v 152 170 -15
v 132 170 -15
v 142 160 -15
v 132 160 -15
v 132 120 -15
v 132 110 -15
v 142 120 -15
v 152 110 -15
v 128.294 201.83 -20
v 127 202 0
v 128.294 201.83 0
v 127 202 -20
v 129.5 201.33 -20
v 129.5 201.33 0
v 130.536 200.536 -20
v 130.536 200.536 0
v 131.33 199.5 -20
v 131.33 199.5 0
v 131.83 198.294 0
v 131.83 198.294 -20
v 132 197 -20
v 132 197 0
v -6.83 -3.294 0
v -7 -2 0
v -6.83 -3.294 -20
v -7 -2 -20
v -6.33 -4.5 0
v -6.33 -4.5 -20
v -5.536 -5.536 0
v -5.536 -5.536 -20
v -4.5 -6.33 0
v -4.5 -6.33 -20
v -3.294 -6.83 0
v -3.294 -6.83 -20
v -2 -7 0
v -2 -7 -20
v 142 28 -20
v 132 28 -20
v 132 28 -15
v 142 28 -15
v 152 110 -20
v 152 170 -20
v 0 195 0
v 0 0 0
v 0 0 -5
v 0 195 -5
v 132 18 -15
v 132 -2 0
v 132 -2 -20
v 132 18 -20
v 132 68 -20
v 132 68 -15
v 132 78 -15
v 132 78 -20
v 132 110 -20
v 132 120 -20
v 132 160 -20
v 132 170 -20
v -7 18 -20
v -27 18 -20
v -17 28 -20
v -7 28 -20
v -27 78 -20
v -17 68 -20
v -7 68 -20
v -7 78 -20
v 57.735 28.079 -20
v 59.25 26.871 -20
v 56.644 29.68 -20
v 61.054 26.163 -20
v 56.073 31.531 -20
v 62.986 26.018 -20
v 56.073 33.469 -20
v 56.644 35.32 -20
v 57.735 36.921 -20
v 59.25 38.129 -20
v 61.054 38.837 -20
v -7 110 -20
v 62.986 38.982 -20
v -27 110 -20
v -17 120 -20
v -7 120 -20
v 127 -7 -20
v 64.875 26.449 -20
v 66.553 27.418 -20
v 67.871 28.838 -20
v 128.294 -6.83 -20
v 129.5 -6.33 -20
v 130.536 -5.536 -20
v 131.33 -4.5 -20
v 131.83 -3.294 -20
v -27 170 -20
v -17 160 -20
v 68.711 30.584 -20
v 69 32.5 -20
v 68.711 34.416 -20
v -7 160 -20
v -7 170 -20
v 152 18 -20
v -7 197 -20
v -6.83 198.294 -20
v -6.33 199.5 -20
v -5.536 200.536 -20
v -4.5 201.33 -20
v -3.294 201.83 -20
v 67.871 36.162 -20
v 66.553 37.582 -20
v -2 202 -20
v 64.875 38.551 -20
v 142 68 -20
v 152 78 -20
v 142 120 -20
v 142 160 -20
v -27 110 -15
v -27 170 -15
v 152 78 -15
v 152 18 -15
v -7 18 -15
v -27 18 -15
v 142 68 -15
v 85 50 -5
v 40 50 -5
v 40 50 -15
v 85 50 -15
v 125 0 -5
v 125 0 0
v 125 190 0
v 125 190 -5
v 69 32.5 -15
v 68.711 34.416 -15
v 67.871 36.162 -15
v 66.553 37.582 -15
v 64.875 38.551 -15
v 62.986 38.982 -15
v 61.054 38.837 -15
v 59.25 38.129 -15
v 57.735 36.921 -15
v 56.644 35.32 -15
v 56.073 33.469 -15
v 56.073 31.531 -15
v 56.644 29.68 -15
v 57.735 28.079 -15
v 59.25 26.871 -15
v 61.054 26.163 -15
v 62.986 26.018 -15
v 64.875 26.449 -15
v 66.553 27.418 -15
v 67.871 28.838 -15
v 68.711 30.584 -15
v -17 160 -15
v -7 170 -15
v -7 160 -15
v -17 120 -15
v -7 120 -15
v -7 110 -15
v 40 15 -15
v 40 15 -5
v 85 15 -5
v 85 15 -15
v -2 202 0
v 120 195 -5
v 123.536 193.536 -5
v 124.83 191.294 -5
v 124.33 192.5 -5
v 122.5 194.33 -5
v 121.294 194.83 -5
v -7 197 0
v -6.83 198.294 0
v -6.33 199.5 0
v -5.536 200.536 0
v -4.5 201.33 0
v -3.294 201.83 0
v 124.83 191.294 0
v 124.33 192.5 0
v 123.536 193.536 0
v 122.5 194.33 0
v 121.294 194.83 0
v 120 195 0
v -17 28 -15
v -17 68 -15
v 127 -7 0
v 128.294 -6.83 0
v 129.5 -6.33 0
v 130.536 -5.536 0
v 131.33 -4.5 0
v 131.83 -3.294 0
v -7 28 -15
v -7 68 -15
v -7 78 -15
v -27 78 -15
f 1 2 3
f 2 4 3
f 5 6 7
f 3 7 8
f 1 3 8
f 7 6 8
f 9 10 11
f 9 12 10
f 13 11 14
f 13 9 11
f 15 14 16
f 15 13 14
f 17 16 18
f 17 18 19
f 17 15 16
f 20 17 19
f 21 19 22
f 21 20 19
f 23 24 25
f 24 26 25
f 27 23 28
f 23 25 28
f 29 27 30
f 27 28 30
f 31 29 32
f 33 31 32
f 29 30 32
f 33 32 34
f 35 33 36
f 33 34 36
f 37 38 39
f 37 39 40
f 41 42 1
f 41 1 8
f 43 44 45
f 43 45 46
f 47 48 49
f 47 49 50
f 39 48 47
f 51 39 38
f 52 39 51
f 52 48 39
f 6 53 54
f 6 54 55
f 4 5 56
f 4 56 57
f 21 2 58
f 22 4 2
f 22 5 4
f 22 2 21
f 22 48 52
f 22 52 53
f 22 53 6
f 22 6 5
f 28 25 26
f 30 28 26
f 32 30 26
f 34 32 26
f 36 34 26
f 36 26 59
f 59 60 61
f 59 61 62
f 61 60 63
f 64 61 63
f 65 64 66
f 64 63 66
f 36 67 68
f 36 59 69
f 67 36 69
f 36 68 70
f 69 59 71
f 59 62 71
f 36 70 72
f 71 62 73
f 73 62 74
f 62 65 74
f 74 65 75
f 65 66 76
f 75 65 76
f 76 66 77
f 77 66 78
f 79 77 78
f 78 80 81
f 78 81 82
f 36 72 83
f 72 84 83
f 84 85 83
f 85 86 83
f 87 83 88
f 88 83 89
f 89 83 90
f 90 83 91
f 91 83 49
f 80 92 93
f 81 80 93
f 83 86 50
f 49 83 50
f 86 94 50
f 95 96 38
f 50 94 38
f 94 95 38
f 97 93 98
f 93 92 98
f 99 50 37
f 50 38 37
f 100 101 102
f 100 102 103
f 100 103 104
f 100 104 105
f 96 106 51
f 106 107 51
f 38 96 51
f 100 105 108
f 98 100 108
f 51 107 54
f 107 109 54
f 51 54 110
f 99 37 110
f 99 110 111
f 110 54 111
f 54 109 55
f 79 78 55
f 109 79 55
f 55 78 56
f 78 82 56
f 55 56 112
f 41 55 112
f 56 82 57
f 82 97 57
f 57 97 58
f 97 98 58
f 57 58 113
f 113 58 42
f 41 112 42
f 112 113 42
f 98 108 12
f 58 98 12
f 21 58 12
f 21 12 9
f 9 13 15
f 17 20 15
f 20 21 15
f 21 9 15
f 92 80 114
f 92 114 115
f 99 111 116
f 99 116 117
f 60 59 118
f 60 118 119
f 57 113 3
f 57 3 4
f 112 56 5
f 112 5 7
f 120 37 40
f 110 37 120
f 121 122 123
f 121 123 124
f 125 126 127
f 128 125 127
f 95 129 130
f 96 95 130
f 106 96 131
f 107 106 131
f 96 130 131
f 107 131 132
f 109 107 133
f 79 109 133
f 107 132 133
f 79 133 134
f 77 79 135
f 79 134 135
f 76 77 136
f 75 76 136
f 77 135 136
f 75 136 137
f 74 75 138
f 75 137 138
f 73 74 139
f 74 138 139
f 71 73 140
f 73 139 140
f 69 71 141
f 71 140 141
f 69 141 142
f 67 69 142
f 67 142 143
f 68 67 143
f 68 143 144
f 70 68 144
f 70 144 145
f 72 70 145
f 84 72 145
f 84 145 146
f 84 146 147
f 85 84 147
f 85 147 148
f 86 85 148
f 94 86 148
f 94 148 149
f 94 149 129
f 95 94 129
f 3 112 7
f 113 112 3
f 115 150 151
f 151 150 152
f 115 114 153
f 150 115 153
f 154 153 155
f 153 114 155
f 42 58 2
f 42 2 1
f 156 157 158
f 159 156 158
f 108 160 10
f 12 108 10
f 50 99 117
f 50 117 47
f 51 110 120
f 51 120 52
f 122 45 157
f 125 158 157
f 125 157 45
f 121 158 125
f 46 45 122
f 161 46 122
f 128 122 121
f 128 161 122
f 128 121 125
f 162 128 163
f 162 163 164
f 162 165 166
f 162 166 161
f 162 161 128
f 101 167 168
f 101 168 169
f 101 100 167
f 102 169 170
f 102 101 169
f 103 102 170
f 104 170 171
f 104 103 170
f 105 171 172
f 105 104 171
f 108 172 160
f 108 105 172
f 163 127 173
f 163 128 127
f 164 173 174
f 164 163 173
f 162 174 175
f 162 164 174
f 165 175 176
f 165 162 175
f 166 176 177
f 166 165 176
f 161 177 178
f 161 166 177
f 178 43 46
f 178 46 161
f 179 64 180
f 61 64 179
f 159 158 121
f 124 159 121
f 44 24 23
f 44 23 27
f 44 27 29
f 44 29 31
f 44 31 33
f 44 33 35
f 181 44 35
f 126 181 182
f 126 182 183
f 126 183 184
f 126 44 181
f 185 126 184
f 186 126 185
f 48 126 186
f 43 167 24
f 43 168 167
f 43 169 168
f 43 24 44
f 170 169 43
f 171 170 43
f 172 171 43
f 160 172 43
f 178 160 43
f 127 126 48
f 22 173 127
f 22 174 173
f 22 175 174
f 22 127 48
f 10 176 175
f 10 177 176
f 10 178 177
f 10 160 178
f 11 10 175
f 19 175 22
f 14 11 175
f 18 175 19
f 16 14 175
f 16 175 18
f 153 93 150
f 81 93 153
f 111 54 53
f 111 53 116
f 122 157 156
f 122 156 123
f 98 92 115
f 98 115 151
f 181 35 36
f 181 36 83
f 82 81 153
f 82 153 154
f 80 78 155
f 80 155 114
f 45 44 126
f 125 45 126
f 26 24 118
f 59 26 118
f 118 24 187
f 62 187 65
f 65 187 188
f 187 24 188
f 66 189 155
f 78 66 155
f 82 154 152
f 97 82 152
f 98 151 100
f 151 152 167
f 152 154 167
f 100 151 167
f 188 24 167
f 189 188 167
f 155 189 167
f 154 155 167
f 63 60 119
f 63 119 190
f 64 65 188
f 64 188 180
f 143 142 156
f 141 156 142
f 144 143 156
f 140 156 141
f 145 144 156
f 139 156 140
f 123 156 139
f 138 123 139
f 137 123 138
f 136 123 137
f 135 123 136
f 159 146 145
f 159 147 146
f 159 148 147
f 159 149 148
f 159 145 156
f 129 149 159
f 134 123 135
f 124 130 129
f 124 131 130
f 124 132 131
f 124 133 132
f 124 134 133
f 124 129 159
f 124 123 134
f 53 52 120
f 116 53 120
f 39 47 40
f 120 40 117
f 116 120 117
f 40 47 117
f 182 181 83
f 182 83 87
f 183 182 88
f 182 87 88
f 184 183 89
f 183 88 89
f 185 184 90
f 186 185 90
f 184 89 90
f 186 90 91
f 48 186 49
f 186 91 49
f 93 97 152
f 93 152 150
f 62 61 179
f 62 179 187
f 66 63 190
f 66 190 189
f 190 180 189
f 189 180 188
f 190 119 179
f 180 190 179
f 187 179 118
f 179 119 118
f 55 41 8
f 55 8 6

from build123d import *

# Parameters (mm, degrees)
F0_W     = 139
F0_H     = 209
F0_W_2   = 125
F0_H_2   = 195
F1_DEPTH = 20
F2_DEPTH = 5
F3_W     = 45
F3_H     = 35
F4_DEPTH = 15
F5_R     = 6.5
F6_DEPTH = 25
F7_R     = 5
F9_DEPTH = 5


with BuildPart() as f1:
    # F0 (on Top) → F1 (new body)
    with BuildSketch(Plane.XY):
        with Locations((62.5, 97.5)):
            Rectangle(F0_W, F0_H)
        with Locations((62.5, 97.5)):
            Rectangle(F0_W_2, F0_H_2, mode=Mode.SUBTRACT)
        with Locations((62.5, 97.5)):
            Rectangle(F0_W_2, F0_H_2)
    extrude(amount=-F1_DEPTH)

    # F0 (on Top) → F2 (cut)
    with BuildSketch(Plane.XY):
        with Locations((62.5, 97.5)):
            Rectangle(F0_W_2, F0_H_2)
    extrude(amount=-F2_DEPTH, mode=Mode.SUBTRACT)

    # F3 (on face) → F4 (cut)
    with BuildSketch(Plane.XY):
        with Locations((62.5, 32.5)):
            Rectangle(F3_W, F3_H)
    extrude(amount=-F4_DEPTH, mode=Mode.SUBTRACT)

    # F5 (on face) → F6 (cut)
    with BuildSketch(Plane.XY):
        with Locations((62.5, 32.5)):
            Circle(F5_R)
    extrude(amount=-F6_DEPTH, mode=Mode.SUBTRACT)

    # F7
    f7_edges = [f1.edges().sort_by_distance(p)[0] for p in [
        (-7, -7, -10),
        (125, 195, -2.5),
        (-7, 202, -10),
        (132, -7, -10),
        (132, 202, -10),
    ]]
    fillet(f7_edges, radius=F7_R)

    # F8 (on face) → F9 (join)
    with BuildSketch(Plane(origin=(0, 0, -20), x_dir=(1, 0, 0), z_dir=(0, 0, -1))):
        Polygon((-27, -170), (-7, -170), (-7, -160), (-17, -160), (-17, -120), (-7, -120), (-7, -110), (-27, -110), align=None)
        Polygon((-27, -78), (-7, -78), (-7, -68), (-17, -68), (-17, -28), (-7, -28), (-7, -18), (-27, -18), align=None)
        Polygon((132, -68), (132, -78), (152, -78), (152, -18), (132, -18), (132, -28), (142, -28), (142, -68), align=None)
        Polygon((132, -170), (152, -170), (152, -110), (132, -110), (132, -120), (142, -120), (142, -160), (132, -160), align=None)
    extrude(amount=-F9_DEPTH)


solid = f1.part
